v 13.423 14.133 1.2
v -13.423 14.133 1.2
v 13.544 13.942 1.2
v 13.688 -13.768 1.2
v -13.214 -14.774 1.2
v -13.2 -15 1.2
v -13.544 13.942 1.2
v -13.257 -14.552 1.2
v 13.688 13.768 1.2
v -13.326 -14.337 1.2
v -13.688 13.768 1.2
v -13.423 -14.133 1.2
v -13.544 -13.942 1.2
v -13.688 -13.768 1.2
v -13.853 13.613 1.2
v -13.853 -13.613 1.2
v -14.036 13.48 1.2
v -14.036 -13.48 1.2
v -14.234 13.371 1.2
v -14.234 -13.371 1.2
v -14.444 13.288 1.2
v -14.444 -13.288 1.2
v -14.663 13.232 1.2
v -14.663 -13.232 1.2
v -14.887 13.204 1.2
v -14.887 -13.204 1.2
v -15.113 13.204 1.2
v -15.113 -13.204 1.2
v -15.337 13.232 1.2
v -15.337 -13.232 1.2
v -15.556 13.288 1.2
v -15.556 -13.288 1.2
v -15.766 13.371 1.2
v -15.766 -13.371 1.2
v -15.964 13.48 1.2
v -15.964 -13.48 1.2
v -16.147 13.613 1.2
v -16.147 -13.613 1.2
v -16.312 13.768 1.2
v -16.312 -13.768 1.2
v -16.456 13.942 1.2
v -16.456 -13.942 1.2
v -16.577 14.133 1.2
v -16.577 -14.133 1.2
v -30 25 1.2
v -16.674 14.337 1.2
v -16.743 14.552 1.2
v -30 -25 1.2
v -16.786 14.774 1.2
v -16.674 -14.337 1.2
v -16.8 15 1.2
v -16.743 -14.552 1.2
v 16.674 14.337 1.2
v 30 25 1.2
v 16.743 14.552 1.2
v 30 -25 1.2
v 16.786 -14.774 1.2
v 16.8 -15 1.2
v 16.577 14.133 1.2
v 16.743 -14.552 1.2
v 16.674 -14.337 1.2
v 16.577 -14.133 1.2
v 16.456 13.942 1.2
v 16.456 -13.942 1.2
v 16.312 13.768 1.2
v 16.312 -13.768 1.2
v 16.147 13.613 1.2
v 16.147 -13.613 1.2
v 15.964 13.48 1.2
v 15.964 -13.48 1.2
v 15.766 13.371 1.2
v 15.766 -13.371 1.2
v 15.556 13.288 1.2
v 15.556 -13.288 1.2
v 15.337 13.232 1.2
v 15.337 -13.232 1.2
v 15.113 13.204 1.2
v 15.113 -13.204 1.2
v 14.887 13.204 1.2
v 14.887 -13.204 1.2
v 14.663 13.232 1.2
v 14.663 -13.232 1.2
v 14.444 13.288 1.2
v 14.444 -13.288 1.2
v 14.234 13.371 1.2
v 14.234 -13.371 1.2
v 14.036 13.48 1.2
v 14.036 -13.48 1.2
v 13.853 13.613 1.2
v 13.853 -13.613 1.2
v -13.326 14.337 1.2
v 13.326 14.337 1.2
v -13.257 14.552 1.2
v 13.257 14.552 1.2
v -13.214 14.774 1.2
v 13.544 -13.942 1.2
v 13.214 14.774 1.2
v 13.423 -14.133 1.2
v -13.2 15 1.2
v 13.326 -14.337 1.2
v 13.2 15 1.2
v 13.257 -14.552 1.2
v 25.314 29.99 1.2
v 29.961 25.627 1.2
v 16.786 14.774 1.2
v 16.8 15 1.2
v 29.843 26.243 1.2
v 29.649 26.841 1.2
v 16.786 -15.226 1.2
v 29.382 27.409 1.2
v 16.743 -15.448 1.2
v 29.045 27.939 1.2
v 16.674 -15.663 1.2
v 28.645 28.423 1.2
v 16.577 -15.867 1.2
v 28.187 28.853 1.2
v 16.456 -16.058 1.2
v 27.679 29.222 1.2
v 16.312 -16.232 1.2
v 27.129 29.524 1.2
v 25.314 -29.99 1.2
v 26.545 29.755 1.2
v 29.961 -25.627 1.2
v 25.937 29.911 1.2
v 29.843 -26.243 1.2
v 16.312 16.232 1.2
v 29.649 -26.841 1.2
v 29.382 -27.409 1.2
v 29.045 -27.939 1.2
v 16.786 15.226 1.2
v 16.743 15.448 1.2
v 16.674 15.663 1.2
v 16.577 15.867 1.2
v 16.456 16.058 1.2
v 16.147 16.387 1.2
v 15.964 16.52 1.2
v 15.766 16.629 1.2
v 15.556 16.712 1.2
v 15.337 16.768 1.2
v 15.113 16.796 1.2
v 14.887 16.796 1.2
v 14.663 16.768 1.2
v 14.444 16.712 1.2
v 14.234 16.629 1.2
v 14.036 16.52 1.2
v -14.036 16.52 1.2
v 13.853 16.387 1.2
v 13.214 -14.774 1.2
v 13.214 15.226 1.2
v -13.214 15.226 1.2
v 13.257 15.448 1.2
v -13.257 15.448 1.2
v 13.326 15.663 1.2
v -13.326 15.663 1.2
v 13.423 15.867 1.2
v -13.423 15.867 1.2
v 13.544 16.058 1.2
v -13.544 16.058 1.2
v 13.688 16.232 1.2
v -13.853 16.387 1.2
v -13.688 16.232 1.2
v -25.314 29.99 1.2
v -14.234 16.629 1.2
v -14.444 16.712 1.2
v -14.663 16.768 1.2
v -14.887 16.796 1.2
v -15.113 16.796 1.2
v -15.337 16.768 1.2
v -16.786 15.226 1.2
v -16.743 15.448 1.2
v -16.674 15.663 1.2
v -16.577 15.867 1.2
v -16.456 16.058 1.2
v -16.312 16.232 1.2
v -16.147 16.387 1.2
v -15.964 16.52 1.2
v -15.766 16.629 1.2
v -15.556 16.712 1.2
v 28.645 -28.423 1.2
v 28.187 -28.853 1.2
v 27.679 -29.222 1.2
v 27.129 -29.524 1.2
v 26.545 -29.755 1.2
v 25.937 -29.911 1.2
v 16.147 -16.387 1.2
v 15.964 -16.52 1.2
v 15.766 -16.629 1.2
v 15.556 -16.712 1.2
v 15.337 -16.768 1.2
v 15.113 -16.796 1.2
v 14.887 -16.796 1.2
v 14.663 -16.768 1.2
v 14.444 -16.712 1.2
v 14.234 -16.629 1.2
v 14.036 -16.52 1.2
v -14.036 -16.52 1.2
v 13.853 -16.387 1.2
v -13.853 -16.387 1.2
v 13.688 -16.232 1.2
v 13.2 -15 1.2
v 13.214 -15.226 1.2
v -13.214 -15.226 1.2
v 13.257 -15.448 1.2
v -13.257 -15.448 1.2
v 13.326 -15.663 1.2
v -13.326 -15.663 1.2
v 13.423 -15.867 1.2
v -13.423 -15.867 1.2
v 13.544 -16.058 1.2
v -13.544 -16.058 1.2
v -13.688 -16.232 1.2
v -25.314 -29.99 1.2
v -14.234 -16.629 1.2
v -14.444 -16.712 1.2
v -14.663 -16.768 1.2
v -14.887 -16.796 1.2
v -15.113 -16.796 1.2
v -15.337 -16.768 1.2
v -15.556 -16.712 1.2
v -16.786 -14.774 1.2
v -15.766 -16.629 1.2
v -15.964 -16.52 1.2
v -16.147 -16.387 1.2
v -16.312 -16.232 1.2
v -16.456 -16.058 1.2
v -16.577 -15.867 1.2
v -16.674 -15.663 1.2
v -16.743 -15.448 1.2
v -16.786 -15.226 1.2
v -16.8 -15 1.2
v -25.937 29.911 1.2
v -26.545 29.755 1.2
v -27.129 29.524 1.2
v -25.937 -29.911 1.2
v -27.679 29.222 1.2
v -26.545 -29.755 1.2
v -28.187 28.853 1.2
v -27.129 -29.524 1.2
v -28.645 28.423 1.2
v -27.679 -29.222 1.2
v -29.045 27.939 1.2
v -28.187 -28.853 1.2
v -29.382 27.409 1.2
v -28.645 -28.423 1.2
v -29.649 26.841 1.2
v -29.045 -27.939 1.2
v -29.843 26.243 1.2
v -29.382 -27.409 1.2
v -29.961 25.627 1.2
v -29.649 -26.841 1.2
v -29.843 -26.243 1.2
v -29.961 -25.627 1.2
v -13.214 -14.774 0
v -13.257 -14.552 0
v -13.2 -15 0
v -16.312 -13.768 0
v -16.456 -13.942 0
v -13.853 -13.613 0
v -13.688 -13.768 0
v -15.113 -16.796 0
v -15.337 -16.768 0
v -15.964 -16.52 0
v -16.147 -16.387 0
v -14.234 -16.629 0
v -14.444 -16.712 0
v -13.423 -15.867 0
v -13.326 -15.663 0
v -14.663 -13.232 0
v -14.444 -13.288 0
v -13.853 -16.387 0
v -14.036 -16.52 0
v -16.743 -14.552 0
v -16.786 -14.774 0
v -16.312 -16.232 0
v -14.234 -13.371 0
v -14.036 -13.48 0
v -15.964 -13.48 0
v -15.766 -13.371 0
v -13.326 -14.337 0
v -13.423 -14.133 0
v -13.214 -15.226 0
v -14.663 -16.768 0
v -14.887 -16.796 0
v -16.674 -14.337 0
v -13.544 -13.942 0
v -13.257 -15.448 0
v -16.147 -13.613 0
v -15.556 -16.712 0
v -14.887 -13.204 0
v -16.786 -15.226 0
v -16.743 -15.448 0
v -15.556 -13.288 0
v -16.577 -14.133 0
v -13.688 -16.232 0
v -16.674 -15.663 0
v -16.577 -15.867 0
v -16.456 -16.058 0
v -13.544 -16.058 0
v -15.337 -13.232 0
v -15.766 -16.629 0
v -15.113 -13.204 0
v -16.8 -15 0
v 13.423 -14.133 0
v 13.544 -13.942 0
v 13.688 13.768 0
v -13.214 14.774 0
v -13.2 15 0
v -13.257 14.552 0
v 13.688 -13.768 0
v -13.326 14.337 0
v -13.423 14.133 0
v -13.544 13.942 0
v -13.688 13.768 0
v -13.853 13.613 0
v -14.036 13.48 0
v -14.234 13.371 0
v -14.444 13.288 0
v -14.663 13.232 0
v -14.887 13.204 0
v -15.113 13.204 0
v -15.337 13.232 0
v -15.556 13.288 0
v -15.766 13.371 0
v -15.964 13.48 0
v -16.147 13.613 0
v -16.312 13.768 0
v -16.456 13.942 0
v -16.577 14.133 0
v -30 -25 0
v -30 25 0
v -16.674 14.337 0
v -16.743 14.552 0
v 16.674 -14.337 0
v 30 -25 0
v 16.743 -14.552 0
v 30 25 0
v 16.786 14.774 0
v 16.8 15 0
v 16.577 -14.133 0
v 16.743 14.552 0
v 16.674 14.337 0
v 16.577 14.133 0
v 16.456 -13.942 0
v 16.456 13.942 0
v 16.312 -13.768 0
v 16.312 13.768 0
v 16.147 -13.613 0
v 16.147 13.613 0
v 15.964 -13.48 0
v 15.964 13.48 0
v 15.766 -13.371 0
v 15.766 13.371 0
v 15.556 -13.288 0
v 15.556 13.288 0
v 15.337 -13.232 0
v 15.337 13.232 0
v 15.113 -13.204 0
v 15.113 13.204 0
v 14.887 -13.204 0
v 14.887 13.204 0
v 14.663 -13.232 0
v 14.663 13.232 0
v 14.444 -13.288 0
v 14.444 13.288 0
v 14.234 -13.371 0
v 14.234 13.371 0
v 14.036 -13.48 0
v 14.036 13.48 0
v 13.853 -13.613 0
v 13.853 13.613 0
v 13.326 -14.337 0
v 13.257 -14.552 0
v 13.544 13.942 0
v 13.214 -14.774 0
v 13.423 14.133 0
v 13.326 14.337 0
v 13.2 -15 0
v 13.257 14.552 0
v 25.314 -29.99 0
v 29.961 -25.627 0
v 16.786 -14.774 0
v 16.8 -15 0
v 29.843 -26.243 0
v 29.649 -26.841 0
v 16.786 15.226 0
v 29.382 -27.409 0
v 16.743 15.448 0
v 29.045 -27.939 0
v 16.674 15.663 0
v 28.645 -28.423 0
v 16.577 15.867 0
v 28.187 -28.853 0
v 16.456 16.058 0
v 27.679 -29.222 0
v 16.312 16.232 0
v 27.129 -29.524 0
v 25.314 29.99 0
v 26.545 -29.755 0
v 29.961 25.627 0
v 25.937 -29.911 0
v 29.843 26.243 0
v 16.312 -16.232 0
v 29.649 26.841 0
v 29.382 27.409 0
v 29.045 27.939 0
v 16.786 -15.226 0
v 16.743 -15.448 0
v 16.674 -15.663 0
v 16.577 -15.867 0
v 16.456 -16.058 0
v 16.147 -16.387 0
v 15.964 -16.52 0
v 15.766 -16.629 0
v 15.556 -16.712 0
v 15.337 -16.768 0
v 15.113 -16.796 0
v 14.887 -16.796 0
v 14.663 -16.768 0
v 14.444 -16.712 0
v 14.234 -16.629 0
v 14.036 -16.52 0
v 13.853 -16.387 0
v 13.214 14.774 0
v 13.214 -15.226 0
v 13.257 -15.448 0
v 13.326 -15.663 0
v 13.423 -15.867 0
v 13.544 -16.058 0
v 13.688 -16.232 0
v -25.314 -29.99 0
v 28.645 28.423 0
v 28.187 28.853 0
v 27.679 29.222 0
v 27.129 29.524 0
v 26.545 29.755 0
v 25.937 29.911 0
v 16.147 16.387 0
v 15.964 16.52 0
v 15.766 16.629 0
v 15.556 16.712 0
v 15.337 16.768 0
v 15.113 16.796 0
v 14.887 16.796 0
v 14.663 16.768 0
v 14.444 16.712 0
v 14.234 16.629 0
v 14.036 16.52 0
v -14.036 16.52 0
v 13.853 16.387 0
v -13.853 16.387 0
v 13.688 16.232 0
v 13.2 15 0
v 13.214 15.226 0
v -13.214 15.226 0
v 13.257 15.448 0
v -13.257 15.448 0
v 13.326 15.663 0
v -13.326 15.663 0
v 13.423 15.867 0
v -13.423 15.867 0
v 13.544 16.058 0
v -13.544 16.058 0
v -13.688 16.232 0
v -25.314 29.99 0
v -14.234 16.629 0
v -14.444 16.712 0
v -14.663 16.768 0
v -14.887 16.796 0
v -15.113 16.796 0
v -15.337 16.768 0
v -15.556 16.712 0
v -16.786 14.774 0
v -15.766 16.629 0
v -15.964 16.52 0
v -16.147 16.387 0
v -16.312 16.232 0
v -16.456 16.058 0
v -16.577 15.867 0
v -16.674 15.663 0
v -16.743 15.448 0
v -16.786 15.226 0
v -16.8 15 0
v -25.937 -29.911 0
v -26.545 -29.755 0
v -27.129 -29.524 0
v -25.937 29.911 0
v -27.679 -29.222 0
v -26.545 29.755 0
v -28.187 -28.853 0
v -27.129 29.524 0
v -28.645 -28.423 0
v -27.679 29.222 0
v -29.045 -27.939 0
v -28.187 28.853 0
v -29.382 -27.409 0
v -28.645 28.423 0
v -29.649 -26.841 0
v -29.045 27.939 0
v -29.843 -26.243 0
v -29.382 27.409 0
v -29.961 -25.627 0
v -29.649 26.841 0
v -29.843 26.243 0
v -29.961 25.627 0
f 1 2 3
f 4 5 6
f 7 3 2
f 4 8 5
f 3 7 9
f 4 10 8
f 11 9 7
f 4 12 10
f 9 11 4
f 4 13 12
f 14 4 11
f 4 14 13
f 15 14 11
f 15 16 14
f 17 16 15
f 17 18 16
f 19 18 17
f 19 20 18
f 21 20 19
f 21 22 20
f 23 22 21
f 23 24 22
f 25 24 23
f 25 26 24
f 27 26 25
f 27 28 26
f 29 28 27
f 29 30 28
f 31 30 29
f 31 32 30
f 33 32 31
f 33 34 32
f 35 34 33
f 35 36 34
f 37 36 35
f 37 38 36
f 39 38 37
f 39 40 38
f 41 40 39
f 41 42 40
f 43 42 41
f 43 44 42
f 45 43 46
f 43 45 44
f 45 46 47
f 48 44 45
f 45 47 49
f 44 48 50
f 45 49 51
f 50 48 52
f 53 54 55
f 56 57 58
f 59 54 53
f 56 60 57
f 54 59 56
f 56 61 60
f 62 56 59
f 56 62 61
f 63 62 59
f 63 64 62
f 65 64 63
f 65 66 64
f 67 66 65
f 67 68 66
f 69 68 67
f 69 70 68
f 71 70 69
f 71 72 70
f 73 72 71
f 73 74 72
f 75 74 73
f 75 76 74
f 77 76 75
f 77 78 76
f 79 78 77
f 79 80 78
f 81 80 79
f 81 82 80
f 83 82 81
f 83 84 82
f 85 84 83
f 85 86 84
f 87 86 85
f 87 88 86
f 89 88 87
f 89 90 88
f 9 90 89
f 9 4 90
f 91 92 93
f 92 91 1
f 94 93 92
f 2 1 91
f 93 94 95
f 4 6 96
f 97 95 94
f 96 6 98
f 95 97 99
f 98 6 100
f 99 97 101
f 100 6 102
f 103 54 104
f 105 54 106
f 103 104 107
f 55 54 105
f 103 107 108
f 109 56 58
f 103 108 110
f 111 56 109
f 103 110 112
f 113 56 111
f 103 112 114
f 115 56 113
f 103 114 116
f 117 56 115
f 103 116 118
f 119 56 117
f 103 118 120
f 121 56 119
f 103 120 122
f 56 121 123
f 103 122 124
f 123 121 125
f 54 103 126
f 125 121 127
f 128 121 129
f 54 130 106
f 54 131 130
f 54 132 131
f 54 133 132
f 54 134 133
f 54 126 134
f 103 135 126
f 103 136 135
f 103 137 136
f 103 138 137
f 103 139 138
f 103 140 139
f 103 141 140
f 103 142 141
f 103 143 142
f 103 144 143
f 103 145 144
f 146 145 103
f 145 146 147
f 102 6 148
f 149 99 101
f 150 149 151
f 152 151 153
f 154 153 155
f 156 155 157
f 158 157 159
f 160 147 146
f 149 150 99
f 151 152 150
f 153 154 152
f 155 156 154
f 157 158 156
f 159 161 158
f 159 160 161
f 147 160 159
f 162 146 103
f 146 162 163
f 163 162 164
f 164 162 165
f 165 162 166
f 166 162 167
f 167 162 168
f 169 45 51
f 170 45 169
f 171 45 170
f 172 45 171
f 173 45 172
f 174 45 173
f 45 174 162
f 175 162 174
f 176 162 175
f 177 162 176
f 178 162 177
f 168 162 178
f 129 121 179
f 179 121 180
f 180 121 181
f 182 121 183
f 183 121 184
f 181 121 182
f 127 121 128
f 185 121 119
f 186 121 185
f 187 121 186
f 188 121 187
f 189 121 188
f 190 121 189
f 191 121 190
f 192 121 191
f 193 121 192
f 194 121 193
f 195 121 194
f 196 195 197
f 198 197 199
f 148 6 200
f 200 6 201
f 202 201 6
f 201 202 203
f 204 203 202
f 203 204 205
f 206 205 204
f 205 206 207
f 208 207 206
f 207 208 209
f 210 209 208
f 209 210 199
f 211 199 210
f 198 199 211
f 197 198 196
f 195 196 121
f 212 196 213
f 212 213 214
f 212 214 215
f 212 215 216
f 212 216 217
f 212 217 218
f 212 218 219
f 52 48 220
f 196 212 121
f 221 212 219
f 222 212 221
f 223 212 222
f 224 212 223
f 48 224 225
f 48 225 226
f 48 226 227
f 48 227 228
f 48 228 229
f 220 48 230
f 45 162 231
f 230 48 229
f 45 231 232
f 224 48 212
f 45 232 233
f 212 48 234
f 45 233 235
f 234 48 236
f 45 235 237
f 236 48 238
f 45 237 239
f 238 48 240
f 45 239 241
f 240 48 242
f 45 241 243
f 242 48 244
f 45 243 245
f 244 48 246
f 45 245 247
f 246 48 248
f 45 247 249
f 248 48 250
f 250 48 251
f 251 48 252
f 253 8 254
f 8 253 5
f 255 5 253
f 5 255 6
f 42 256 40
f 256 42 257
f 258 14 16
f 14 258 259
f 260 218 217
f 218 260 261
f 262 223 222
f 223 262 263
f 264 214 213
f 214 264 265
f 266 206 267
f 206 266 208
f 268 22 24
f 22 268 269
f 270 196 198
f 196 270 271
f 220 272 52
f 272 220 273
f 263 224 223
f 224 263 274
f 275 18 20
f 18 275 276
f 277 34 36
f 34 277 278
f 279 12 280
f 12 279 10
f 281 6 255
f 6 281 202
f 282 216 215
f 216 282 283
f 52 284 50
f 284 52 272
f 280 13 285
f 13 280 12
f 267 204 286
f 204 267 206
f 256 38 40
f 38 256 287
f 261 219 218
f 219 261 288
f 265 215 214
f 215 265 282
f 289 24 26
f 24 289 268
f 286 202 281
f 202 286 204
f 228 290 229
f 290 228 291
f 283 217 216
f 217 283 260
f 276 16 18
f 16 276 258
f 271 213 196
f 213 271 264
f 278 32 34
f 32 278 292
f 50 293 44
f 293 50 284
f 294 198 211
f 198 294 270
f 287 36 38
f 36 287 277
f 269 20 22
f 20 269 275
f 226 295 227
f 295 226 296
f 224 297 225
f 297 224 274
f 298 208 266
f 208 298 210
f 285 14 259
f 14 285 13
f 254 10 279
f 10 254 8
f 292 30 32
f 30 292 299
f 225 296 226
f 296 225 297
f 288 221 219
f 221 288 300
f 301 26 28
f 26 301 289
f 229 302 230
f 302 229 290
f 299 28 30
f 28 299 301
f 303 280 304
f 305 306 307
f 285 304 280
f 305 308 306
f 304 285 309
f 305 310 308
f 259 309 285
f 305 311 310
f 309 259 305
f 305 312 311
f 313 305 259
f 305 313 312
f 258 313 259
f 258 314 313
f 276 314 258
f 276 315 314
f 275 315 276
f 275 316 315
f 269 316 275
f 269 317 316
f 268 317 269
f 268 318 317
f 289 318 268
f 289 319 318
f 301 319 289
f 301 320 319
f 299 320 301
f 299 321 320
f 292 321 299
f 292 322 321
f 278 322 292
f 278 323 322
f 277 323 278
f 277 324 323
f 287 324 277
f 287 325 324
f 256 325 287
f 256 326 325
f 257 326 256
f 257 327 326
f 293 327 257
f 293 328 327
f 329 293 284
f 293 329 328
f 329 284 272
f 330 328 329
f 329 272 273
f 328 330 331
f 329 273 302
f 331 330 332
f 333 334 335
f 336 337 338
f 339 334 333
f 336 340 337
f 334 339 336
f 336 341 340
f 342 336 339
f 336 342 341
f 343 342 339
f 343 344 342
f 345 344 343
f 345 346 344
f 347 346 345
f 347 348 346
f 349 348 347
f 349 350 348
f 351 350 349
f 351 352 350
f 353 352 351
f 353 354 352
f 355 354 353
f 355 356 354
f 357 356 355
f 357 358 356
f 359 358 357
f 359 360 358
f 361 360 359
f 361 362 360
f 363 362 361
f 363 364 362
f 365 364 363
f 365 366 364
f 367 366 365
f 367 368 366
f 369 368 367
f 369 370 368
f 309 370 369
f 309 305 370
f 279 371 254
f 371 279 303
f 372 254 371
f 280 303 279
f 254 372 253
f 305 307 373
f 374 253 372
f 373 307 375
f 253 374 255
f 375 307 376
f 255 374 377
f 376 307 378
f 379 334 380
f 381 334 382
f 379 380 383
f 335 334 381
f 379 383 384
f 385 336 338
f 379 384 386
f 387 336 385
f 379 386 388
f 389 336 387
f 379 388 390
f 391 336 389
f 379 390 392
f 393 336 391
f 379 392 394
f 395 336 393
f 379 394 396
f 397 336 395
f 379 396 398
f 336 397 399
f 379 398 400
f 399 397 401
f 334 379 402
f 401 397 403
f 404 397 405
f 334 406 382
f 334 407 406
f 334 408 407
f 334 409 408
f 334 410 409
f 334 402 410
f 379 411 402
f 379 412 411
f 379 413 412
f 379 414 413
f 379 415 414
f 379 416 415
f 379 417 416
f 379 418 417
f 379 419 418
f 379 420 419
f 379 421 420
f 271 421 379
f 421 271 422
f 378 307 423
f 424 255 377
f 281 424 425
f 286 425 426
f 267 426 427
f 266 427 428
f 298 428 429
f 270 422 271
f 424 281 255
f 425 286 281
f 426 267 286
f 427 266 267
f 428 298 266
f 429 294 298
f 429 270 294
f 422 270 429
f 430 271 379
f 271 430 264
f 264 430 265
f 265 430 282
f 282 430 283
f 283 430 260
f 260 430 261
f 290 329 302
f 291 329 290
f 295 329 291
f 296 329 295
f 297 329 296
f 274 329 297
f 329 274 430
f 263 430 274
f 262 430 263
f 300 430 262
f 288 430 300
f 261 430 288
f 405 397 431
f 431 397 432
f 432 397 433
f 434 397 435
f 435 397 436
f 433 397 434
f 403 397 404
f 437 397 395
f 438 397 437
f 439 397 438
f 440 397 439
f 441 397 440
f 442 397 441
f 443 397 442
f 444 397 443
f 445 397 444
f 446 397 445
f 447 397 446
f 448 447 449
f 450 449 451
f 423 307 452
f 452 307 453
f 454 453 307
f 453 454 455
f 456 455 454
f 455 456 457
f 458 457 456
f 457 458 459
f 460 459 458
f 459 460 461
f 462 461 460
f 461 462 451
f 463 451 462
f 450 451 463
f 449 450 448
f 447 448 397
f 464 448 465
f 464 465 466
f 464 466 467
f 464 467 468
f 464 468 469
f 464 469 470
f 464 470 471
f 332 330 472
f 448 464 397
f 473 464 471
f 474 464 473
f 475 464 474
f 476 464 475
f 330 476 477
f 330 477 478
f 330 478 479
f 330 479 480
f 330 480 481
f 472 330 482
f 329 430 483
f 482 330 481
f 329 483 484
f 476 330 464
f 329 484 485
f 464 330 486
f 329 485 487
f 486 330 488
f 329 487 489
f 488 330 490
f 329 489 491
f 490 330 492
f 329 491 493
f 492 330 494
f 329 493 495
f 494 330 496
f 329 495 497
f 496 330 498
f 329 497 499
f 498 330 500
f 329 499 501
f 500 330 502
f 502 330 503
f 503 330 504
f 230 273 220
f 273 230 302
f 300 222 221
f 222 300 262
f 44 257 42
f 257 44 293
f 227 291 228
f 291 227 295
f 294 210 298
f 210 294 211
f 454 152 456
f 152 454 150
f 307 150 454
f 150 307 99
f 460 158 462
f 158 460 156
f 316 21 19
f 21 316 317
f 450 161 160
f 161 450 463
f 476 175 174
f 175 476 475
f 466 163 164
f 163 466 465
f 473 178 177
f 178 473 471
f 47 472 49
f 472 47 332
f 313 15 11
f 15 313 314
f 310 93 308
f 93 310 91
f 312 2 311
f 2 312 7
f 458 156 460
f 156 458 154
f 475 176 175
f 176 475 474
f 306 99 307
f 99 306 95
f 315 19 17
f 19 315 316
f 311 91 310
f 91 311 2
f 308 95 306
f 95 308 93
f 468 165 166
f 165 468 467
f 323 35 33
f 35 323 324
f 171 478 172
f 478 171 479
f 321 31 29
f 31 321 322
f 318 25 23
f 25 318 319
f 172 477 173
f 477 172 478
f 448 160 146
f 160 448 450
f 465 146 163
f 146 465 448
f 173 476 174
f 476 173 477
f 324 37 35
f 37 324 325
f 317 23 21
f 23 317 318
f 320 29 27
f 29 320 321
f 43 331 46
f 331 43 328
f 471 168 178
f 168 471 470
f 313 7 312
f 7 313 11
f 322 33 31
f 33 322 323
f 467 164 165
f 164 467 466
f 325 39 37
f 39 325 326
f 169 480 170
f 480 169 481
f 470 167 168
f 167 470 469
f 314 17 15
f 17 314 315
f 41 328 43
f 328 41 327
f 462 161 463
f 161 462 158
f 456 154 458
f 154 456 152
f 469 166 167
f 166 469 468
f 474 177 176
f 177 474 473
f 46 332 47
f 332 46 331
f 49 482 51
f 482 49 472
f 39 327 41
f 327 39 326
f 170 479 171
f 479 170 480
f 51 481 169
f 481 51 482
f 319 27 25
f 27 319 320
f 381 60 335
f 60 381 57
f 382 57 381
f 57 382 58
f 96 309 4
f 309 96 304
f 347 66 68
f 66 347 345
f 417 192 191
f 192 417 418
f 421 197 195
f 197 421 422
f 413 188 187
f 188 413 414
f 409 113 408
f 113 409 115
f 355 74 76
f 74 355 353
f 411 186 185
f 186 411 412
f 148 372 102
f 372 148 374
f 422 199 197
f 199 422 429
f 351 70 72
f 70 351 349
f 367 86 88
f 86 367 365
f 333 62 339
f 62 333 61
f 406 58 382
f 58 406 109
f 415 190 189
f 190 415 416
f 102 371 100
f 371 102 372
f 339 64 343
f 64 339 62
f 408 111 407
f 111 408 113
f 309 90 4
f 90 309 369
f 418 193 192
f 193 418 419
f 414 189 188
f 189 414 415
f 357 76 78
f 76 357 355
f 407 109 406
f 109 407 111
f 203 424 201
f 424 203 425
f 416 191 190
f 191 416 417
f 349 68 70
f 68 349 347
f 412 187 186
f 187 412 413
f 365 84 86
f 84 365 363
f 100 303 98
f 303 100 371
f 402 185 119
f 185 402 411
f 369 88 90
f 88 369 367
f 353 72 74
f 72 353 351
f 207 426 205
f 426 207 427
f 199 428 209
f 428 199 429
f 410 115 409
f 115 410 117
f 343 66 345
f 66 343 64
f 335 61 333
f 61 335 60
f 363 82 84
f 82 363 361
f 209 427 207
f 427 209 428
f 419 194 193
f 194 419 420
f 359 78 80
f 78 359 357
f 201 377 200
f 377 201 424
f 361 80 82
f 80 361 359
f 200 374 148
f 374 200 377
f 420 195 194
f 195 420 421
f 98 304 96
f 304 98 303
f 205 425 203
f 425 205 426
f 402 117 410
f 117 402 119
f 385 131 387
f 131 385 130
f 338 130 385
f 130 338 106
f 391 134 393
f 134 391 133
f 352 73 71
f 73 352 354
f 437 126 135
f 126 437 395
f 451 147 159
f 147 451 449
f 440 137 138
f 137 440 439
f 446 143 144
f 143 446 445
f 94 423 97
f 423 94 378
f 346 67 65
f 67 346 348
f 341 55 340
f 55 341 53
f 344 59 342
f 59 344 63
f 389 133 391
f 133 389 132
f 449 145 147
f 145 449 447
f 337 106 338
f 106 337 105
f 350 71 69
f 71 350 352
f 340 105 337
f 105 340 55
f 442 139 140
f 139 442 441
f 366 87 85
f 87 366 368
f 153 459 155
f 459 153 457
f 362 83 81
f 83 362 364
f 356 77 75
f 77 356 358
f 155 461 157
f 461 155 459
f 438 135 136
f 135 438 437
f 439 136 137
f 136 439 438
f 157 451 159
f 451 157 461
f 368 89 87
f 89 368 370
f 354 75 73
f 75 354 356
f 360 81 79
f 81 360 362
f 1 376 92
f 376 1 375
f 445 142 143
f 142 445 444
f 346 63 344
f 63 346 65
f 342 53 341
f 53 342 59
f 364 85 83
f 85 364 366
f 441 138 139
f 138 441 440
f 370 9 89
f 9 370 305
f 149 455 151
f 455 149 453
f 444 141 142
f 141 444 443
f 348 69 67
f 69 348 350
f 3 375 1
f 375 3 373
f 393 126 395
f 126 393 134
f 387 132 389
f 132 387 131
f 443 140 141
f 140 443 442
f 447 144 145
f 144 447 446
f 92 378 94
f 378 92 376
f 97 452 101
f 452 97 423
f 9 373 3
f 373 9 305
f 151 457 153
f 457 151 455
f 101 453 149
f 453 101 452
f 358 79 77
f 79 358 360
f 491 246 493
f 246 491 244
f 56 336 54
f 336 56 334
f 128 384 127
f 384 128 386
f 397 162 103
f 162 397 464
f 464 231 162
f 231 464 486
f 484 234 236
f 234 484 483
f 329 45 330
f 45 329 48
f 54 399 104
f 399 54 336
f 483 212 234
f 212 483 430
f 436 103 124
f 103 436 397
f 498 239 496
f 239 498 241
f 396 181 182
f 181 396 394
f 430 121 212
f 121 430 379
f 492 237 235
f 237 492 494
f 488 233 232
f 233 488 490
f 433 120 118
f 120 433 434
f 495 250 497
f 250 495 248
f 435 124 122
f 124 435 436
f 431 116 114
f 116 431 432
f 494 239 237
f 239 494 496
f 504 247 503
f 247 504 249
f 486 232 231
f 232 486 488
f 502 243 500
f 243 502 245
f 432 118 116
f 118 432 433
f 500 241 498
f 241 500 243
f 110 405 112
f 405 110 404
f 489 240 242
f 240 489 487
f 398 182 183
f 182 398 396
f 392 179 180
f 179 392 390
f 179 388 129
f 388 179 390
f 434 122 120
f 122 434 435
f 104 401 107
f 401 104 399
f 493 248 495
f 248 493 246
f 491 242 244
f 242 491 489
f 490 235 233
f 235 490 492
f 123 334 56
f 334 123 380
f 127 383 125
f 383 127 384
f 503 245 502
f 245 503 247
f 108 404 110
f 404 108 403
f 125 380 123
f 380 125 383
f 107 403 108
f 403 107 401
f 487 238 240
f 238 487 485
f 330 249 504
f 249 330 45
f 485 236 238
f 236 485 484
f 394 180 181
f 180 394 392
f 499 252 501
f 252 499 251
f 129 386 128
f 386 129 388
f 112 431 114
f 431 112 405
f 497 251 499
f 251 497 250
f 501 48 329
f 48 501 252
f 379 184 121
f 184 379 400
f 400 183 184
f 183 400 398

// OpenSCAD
$fn = 50;


difference() {
	union() {
		hull() {
			translate(v = [-25.0000000000, 25.0000000000, 0]) {
				cylinder(h = 18, r = 5);
			}
			translate(v = [25.0000000000, 25.0000000000, 0]) {
				cylinder(h = 18, r = 5);
			}
			translate(v = [-25.0000000000, -25.0000000000, 0]) {
				cylinder(h = 18, r = 5);
			}
			translate(v = [25.0000000000, -25.0000000000, 0]) {
				cylinder(h = 18, r = 5);
			}
		}
	}
	union() {
		translate(v = [0, 0, 1.2000000000]) {
			hull() {
				translate(v = [-25.0000000000, 25.0000000000, 0]) {
					cylinder(h = 16.8000000000, r = 3.8000000000);
				}
				translate(v = [25.0000000000, 25.0000000000, 0]) {
					cylinder(h = 16.8000000000, r = 3.8000000000);
				}
				translate(v = [-25.0000000000, -25.0000000000, 0]) {
					cylinder(h = 16.8000000000, r = 3.8000000000);
				}
				translate(v = [25.0000000000, -25.0000000000, 0]) {
					cylinder(h = 16.8000000000, r = 3.8000000000);
				}
			}
		}
		#translate(v = [-15.0000000000, -15.0000000000, 0]) {
			cylinder(h = 1.2000000000, r = 1.8000000000);
		}
		#translate(v = [-15.0000000000, 15.0000000000, 0]) {
			cylinder(h = 1.2000000000, r = 1.8000000000);
		}
		#translate(v = [15.0000000000, -15.0000000000, 0]) {
			cylinder(h = 1.2000000000, r = 1.8000000000);
		}
		#translate(v = [15.0000000000, 15.0000000000, 0]) {
			cylinder(h = 1.2000000000, r = 1.8000000000);
		}
		translate(v = [-250.0000000000, -250.0000000000, 1.2000000000]) {
			cube(size = [500, 500, 500]);
		}
		translate(v = [-250.0000000000, -250.0000000000, 1.2000000000]) {
			cube(size = [500, 500, 500]);
		}
		translate(v = [-250.0000000000, -250.0000000000, 1.2000000000]) {
			cube(size = [500, 500, 500]);
		}
	}
}
